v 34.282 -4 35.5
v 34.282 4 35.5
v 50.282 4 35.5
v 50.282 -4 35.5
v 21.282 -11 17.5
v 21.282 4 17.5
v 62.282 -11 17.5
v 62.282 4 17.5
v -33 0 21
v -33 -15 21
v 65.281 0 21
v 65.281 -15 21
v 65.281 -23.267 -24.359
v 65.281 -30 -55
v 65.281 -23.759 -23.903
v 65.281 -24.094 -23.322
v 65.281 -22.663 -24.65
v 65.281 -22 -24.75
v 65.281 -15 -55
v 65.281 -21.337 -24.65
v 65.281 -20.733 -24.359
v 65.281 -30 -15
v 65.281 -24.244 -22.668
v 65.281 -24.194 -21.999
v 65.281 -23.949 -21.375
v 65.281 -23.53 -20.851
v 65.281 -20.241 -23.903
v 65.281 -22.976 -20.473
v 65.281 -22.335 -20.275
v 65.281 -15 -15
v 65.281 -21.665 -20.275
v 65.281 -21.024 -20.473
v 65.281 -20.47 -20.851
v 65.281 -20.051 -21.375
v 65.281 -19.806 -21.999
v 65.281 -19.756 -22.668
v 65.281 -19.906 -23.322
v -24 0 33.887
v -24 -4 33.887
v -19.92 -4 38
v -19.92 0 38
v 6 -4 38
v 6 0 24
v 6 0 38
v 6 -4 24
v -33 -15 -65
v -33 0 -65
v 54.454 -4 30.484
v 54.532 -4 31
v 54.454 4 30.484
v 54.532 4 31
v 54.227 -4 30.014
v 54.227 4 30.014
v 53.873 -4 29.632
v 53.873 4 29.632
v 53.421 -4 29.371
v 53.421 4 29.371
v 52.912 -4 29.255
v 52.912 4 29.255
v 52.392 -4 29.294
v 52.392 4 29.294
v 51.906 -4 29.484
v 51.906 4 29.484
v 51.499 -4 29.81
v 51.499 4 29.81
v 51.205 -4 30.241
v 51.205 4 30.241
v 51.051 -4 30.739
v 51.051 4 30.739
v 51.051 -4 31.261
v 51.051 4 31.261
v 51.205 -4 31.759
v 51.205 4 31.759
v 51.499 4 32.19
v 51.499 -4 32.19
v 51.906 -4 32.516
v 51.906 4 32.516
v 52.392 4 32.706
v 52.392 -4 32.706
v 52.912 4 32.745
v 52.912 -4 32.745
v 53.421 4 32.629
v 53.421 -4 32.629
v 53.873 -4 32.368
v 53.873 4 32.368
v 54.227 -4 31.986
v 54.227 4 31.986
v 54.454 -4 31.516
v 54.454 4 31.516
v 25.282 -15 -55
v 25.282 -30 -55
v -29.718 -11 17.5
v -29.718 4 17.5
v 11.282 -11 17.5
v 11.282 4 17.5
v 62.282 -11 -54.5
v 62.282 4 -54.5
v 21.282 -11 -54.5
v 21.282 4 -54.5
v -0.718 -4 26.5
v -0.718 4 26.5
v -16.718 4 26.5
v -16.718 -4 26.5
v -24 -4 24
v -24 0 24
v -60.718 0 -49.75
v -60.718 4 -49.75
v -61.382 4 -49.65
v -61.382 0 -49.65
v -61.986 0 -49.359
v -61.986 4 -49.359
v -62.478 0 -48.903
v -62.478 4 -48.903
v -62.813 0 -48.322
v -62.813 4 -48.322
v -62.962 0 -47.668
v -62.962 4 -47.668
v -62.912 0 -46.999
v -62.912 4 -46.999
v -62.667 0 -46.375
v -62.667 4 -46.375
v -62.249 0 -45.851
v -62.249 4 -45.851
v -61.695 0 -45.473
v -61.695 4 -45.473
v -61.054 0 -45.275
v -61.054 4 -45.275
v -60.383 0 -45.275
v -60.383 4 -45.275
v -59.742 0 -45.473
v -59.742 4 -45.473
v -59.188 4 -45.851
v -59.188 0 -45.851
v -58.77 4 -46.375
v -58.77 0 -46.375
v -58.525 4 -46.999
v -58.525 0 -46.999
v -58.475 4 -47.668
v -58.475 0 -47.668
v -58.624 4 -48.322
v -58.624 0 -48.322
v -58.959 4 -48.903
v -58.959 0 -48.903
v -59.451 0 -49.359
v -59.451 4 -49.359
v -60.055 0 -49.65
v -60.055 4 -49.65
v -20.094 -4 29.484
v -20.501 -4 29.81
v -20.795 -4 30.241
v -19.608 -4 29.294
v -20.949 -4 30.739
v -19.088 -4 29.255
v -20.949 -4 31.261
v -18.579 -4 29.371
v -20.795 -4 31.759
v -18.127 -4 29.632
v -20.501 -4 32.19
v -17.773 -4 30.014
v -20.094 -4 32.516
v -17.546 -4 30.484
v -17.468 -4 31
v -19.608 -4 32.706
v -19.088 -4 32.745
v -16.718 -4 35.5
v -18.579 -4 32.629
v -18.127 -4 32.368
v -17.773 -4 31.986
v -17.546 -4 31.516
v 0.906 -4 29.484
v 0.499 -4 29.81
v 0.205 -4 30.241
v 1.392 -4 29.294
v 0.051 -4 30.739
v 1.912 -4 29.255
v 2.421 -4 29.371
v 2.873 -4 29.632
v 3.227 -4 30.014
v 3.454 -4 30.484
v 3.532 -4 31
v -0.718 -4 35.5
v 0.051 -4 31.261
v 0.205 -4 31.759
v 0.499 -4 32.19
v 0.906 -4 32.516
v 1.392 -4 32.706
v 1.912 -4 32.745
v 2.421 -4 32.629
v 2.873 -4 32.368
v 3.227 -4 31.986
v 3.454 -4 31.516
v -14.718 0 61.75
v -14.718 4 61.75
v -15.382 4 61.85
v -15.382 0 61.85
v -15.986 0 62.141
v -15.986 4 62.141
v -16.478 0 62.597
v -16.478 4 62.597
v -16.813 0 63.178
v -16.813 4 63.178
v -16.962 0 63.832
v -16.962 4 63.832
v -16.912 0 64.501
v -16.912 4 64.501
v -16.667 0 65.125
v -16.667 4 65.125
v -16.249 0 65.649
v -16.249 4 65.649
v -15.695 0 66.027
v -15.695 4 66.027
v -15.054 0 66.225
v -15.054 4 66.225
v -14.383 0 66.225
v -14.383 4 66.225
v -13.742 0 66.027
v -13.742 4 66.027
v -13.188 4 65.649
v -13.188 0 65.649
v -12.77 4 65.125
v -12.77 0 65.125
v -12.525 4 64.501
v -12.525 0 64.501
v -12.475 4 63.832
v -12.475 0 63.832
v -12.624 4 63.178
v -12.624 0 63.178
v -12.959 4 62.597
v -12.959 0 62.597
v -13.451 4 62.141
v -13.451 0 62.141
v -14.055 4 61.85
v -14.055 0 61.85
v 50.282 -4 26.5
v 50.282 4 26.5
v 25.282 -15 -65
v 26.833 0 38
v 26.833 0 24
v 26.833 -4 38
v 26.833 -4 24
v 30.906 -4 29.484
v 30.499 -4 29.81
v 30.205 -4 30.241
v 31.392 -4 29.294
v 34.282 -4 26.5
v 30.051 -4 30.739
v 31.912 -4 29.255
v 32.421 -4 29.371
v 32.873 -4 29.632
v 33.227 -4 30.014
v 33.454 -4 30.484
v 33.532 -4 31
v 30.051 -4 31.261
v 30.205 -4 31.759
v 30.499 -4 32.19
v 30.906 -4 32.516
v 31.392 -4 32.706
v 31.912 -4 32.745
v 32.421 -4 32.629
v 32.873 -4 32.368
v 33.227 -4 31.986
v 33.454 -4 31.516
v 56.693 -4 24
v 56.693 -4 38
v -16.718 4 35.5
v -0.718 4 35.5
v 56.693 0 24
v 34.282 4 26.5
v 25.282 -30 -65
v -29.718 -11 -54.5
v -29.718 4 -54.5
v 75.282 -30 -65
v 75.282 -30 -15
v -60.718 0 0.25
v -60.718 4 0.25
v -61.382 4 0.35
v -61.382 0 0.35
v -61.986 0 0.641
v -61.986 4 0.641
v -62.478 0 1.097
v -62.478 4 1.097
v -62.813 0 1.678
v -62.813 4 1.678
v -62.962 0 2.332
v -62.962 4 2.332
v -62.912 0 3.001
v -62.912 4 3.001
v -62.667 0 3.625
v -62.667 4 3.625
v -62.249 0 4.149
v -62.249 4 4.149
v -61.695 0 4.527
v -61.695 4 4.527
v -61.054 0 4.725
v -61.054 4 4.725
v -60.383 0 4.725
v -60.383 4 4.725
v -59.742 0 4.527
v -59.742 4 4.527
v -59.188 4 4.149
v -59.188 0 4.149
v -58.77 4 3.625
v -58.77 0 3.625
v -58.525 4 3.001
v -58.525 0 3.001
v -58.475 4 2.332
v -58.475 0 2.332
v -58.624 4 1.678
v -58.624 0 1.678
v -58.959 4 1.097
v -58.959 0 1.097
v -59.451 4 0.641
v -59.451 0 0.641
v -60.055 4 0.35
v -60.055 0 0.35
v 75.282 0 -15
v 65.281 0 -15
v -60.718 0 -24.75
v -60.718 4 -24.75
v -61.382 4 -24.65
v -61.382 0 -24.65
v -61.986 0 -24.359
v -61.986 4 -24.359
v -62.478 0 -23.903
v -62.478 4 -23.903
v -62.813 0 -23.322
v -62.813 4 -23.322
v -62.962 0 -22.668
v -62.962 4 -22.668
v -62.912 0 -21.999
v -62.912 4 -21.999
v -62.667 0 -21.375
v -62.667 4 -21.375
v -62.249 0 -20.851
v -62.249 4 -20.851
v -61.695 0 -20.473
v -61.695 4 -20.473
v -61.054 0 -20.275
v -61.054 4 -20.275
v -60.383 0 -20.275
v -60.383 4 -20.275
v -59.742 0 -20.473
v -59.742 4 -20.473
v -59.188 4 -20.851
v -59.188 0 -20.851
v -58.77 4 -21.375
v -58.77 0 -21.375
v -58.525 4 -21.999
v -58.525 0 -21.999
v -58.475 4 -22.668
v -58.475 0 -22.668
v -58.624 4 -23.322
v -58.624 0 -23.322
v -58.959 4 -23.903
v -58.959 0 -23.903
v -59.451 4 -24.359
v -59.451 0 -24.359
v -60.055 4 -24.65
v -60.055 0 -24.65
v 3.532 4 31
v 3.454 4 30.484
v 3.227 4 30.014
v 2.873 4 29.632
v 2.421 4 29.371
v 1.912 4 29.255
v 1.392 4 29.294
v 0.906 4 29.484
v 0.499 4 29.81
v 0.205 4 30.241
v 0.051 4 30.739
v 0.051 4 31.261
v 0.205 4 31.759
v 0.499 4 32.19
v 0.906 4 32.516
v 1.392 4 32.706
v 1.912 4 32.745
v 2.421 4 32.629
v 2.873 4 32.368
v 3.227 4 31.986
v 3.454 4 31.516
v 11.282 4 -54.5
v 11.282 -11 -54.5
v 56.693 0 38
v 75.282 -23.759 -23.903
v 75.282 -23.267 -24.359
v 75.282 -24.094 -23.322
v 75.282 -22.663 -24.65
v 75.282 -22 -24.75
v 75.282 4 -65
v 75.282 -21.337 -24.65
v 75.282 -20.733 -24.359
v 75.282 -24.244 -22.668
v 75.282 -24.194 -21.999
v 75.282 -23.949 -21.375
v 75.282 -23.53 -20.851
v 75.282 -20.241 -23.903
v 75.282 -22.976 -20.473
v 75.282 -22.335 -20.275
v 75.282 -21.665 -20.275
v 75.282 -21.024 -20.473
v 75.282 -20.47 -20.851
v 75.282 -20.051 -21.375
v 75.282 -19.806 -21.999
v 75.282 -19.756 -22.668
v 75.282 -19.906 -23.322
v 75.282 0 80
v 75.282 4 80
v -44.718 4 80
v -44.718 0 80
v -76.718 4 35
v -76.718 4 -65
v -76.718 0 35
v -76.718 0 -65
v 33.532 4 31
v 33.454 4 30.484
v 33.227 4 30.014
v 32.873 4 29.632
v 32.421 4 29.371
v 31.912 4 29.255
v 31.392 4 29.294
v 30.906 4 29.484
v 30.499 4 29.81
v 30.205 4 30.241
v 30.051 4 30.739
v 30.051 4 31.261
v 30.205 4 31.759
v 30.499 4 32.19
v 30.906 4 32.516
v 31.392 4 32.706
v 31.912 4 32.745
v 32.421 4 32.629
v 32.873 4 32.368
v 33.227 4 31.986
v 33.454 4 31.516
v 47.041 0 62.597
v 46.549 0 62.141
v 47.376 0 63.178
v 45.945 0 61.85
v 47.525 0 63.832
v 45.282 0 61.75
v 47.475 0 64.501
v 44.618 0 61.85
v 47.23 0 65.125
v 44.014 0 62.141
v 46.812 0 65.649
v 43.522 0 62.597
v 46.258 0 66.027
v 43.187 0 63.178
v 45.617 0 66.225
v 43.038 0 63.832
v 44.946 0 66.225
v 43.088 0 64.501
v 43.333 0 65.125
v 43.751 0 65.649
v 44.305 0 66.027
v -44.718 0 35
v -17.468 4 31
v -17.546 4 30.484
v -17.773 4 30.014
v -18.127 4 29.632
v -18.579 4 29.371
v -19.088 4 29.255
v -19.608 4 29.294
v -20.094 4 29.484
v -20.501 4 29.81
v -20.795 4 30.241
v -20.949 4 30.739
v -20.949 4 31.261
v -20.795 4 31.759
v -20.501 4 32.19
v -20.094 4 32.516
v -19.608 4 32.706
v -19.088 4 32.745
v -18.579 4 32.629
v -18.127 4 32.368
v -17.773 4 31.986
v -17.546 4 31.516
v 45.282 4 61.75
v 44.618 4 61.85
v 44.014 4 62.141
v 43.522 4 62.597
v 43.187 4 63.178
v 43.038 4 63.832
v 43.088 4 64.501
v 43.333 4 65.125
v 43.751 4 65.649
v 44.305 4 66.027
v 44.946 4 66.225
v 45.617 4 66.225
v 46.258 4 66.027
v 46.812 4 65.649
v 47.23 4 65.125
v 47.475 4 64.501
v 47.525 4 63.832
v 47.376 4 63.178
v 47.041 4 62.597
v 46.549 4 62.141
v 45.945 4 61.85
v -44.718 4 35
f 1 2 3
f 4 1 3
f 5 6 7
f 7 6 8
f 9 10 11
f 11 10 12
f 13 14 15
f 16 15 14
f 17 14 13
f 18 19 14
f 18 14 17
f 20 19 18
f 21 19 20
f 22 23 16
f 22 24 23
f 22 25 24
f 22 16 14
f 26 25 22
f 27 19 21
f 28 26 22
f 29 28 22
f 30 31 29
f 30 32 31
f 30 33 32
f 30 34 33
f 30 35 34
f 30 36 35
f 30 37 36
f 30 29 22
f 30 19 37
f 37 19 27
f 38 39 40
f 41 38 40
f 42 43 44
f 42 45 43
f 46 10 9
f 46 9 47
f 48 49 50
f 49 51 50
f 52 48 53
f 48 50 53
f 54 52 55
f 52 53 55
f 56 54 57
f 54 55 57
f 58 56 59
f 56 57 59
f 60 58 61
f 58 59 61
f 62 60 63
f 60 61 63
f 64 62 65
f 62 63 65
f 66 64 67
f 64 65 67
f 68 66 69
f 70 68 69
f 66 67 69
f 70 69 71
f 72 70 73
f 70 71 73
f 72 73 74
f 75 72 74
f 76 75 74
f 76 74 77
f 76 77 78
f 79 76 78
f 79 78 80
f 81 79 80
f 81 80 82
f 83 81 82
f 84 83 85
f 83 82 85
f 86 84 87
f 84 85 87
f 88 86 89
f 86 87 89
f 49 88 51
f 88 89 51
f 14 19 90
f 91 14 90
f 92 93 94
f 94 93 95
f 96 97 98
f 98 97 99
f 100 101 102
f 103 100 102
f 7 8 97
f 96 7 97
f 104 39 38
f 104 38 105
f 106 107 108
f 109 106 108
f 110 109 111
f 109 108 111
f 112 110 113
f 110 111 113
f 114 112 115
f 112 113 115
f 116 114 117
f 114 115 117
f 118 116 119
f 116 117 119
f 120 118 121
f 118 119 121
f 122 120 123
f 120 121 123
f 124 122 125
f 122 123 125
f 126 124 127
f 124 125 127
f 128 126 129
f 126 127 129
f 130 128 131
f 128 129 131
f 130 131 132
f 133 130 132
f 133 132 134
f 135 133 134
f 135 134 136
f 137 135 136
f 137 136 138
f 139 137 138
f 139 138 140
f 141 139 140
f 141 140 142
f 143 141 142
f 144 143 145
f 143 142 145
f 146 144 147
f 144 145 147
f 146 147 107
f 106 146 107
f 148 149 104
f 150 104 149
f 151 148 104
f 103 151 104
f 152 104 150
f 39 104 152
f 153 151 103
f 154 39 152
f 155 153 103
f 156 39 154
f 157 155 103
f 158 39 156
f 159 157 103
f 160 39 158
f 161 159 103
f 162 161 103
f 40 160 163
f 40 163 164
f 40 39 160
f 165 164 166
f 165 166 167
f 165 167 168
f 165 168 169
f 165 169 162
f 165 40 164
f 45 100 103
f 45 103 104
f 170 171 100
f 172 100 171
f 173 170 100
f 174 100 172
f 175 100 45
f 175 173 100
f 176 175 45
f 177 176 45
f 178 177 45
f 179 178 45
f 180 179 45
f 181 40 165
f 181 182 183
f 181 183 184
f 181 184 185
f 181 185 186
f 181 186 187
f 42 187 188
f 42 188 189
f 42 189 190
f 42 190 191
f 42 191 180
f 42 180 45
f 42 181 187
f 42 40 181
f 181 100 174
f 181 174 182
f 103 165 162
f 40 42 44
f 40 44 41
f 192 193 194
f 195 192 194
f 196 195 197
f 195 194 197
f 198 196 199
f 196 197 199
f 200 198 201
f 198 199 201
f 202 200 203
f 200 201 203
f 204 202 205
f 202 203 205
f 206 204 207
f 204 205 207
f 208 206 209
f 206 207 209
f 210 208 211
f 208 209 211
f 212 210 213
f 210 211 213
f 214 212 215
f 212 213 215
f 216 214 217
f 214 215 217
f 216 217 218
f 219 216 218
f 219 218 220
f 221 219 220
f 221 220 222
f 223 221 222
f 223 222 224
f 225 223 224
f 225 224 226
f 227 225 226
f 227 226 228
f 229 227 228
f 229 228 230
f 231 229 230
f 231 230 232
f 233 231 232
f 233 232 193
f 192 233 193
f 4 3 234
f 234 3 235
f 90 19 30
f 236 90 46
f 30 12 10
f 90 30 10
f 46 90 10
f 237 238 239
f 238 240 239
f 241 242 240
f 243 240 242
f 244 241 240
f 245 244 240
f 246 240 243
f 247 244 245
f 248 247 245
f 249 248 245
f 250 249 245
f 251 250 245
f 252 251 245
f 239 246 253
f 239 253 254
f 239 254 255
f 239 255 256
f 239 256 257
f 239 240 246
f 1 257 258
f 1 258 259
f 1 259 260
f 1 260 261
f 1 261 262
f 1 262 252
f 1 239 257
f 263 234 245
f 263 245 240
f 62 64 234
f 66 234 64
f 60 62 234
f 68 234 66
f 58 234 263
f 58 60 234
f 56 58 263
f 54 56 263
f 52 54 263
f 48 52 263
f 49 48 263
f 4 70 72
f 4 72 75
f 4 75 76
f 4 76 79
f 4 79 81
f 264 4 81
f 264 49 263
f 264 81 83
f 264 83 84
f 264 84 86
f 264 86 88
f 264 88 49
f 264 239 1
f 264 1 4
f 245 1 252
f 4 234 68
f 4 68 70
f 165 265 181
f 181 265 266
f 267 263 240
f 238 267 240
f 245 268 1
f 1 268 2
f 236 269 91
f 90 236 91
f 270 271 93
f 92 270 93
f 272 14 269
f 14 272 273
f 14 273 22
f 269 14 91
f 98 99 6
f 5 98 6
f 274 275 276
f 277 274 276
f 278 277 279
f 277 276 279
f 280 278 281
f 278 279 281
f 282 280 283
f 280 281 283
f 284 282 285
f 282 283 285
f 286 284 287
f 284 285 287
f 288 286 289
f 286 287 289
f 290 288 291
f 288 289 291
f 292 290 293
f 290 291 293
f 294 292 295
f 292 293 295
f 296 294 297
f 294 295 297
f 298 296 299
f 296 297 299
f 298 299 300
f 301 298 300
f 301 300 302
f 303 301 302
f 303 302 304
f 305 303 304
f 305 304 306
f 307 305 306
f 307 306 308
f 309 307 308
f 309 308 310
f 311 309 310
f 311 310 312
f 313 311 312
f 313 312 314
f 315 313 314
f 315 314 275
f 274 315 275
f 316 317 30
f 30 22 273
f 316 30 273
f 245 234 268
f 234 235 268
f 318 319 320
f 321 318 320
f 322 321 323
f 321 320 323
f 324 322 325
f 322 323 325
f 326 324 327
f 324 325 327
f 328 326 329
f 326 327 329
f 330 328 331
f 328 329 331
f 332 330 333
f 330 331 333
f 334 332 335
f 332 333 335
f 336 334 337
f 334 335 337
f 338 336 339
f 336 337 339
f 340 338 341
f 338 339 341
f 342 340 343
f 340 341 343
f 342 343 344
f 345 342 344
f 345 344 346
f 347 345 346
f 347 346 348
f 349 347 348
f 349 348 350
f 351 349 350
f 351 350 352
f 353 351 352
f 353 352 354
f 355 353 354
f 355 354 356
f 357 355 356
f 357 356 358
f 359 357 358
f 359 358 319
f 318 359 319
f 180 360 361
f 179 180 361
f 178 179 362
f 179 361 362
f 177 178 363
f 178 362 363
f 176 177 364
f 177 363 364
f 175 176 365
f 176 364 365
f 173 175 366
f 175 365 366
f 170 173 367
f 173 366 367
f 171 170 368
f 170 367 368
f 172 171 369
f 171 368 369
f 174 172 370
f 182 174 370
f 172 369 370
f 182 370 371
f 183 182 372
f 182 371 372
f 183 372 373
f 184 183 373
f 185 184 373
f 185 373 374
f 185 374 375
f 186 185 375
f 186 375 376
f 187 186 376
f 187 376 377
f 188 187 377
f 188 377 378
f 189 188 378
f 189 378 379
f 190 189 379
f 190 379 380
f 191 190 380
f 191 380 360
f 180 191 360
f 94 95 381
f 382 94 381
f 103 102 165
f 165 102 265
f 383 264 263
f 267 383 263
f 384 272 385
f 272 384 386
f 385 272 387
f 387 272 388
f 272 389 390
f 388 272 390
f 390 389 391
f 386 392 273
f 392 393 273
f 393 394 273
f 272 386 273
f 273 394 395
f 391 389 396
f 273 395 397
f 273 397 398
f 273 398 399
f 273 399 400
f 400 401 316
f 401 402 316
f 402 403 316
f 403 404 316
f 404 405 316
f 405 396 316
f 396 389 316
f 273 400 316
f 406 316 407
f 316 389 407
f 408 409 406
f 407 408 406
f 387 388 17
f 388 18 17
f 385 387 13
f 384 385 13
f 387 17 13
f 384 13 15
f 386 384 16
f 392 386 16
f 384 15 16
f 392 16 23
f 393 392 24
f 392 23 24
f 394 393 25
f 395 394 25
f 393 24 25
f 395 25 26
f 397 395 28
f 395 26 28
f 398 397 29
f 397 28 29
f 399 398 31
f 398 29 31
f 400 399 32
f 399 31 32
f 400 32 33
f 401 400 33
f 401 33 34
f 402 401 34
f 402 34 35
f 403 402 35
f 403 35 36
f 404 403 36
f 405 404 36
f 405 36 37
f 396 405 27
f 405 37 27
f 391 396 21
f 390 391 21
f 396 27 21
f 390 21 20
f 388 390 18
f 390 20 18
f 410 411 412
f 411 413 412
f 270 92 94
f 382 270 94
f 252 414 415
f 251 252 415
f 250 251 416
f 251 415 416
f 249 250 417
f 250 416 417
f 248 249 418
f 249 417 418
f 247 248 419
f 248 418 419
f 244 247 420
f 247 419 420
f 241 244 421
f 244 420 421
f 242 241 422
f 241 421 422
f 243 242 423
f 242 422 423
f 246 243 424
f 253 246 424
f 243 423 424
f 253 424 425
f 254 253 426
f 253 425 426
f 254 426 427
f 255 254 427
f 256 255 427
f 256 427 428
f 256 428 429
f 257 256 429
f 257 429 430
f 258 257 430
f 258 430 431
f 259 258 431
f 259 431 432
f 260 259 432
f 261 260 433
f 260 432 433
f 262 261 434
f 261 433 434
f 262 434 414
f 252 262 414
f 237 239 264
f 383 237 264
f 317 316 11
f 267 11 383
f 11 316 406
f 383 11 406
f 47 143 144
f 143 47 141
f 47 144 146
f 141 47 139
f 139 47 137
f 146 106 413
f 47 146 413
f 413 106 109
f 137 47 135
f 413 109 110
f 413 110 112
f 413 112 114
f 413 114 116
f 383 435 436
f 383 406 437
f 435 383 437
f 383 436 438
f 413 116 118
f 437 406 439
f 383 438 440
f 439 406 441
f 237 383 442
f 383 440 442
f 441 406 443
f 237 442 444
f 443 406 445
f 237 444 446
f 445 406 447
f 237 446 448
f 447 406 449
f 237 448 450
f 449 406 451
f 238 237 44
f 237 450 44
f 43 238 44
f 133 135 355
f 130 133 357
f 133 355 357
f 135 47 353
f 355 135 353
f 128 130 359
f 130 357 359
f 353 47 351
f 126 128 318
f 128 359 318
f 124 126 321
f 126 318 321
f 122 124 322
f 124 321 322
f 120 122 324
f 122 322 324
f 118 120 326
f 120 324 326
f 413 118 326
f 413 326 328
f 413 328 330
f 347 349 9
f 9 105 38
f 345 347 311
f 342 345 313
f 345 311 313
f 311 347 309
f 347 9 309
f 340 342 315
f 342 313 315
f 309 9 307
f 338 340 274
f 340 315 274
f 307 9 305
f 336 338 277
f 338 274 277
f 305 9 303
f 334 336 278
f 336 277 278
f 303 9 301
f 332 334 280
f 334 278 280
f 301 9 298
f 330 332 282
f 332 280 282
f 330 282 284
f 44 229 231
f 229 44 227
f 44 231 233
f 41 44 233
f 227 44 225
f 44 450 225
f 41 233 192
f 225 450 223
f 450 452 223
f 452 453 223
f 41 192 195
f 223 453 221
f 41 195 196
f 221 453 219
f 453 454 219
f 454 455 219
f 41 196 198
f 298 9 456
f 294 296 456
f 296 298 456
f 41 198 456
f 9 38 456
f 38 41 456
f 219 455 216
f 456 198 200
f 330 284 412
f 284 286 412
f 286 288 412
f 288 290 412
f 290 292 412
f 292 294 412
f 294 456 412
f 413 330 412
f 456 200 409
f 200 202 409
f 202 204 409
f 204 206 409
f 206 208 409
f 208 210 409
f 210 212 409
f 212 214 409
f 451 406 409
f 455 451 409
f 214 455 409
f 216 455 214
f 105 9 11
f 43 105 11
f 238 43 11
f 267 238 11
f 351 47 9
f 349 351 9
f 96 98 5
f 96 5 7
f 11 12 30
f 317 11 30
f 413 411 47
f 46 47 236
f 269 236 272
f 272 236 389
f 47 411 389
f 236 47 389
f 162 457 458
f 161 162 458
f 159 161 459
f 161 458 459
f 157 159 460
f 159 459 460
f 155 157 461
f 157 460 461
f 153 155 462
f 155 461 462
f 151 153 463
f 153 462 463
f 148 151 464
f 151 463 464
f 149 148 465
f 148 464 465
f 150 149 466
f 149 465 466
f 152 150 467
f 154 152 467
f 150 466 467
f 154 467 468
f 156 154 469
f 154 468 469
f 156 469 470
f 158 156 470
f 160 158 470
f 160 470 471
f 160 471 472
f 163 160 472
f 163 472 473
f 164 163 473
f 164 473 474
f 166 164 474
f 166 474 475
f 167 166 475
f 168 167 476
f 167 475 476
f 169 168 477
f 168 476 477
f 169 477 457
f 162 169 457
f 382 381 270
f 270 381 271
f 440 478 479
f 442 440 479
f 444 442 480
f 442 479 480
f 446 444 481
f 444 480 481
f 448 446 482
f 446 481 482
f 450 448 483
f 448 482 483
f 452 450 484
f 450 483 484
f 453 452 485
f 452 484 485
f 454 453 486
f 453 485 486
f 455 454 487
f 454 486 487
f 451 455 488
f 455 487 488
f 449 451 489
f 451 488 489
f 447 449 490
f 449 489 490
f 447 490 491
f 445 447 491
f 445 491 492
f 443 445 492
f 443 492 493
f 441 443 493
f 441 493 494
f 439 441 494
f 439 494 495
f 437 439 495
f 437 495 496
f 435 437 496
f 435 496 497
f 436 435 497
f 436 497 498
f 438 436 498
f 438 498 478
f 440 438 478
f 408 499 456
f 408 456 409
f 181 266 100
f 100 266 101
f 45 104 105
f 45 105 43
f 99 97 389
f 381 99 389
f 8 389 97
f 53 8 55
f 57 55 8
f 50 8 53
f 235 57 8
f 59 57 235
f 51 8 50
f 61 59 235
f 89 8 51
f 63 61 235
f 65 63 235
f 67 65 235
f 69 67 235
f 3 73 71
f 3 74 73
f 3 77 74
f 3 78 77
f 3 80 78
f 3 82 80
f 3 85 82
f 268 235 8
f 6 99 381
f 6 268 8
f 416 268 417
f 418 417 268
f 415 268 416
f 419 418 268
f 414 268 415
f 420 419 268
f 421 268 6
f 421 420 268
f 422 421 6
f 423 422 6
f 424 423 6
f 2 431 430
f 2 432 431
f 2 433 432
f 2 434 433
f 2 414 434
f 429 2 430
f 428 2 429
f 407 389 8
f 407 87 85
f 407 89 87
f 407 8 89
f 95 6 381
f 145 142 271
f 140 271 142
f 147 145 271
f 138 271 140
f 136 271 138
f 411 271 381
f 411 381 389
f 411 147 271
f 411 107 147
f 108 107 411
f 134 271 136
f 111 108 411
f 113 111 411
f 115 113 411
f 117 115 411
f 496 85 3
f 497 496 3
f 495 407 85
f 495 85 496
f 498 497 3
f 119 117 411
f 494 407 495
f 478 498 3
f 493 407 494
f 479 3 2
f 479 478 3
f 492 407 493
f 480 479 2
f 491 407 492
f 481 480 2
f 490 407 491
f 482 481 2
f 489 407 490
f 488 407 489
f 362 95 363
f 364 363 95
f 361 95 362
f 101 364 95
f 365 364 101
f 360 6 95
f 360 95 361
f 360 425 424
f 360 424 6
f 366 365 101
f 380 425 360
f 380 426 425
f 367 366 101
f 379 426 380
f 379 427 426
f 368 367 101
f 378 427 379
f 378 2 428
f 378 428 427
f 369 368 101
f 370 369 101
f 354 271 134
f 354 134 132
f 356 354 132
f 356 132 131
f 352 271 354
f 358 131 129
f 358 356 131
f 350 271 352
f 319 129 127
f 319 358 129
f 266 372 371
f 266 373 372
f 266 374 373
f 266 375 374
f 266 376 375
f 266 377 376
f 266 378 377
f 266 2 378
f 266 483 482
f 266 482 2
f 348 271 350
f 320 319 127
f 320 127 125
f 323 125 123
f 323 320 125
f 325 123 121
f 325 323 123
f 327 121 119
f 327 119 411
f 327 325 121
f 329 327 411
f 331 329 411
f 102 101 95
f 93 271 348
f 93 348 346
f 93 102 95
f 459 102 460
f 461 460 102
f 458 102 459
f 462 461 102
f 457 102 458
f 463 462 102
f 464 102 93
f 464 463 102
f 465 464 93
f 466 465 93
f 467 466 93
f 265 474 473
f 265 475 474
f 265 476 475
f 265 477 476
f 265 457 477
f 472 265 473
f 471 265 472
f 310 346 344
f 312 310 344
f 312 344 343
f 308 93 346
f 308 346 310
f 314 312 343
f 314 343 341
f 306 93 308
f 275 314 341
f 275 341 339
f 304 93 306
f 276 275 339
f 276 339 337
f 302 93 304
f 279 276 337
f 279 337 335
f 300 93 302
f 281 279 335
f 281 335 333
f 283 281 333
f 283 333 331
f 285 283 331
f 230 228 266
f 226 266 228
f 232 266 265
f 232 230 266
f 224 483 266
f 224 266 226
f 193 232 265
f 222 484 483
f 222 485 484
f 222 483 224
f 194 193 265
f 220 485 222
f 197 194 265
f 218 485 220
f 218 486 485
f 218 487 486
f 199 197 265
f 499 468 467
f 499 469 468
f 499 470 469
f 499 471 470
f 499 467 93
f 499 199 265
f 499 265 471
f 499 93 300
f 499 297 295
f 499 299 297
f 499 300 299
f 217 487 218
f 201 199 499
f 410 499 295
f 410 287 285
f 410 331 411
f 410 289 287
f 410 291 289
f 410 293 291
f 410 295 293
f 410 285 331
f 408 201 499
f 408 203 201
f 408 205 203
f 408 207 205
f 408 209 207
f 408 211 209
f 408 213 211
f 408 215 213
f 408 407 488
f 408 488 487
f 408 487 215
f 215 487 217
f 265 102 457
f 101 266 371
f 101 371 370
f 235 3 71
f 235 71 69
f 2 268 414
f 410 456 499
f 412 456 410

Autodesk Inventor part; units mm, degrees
ref_plane "YZ Plane" through (0, 0, 0) normal (1, 0, 0) x (0, 1, 0)
ref_plane "XZ Plane" through (0, 0, 0) normal (0, 1, 0) x (-1, 0, 0)
ref_plane "XY Plane" through (0, 0, 0) normal (0, 0, 1) x (1, 0, 0)
sketch "Szkic1" plane through (0, 0, 0) normal (0, 1, 0) x (-1, 0, 0)
  line L0 (44.7185, 35) -> (76.7185, 35)
  line L1 (76.7185, 35) -> (44.7185, 35)
  line L2 (44.7185, -65) -> (76.7185, -65)
  line L3 (76.7185, -65) -> (76.7185, 35)
  line L4 (44.7185, 80) -> (-75.2815, 80)
  line L5 (44.7185, 48) -> (44.7185, 80)
  line L6 (44.7185, -65) -> (44.7185, -55)
  line L7 (-75.2815, -65) -> (-75.2815, 48)
  line L8 (44.7185, -65) -> (-75.2815, -65)
  line L9 (-75.2815, 48) -> (-65.2815, 48)
  line L10 (-75.2815, 48) -> (-75.2815, 80)
  line L11 (44.7185, 35) -> (44.7185, -55)
  line L12 (-65.2815, -55) -> (44.7185, -55)
  line L13 (-65.2815, -55) -> (-65.2815, 48)
  line L14 (44.7185, 48) -> (-65.2815, 48)
  line L15 (44.7185, 35) -> (44.7185, 48)
  point P0 (0, 0)
  point P1 (14.7185, 64)
  point P2 (-45.2815, 64)
  point P3 (60.7185, 2.5)
  point P4 (60.7185, -47.5)
  point P5 (60.7185, -22.5)
  dimension "d2" = 32
  dimension "d3" = 45
  dimension "d4" = 32
  dimension "d5" = 32
  dimension "d23" = 100
  dimension "d24" = 10
  dimension "d25" = 10
  dimension "d26" = 120
  dimension "d27" = 16
  dimension "d28" = 16
  dimension "d29" = 50
  dimension "d30" = 16
  dimension "d31" = 16
  dimension "d32" = 60
  dimension "d33" = 17.5
  dimension "d34" = 30
  dimension "d126" = 42.5
extrude "Wyciągnięcie proste1" add sketch "Szkic1" along normal blind 4
extrude "Wyciągnięcie proste2" add sketch "Szkic1" against normal blind 15 contours L11 L12 L13 L14 L15
extrude "Wyciągnięcie proste3" add sketch "Szkic1" against normal blind 30 contours L6 L8 L7 L9 L13 L12
sketch "Szkic3" plane through (0, 4, 0) normal (0, 1, 0) x (1, 0, 0)
  line L0 (-76.7185, -35) -> (-44.7185, -35) projected
  line L1 (-44.7185, -35) -> (-44.7185, -80) projected
  line L2 (-44.7185, -80) -> (75.2815, -80) projected
  line L3 (75.2815, -80) -> (75.2815, 65) projected
  line L4 (75.2815, 65) -> (-76.7185, 65) projected
  line L5 (-76.7185, 65) -> (-76.7185, -35) projected
  line L6 (-44.7185, -48) -> (75.2815, -48) projected
  line L7 (-44.7185, 65) -> (-44.7185, -35) projected
  line L8 (-44.7185, 55) -> (65.2815, 55) projected
  line L9 (65.2815, 55) -> (65.2815, -48) projected
  line L10 (-29.7185, -17.5) -> (11.2815, -17.5)
  line L11 (11.2815, -17.5) -> (11.2815, 54.5)
  line L12 (11.2815, 54.5) -> (-29.7185, 54.5)
  line L13 (-29.7185, 54.5) -> (-29.7185, -17.5)
  line L14 (21.2815, -17.5) -> (62.2815, -17.5)
  line L15 (62.2815, -17.5) -> (62.2815, 54.5)
  line L16 (62.2815, 54.5) -> (21.2815, 54.5)
  line L17 (21.2815, 54.5) -> (21.2815, -17.5)
  line L18 (-16.7185, -35.5) -> (-0.7185, -35.5)
  line L19 (-0.7185, -35.5) -> (-0.7185, -26.5)
  line L20 (-0.7185, -26.5) -> (-16.7185, -26.5)
  line L21 (-16.7185, -26.5) -> (-16.7185, -35.5)
  line L22 (-16.7185, -35.5) -> (-0.7185, -26.5) construction
  line L23 (-0.7185, -35.5) -> (-16.7185, -26.5) construction
  circle A0 centre (-19.2185, -31) radius 1.75
  circle A1 centre (1.7815, -31) radius 1.75
  line L24 (-19.2185, -31) -> (1.7815, -31) construction
  circle A2 centre (52.7815, -31) radius 1.75
  line L25 (50.2815, -35.5) -> (50.2815, -26.5)
  line L26 (50.2815, -26.5) -> (34.2815, -26.5)
  line L27 (34.2815, -26.5) -> (34.2815, -35.5)
  line L28 (34.2815, -35.5) -> (50.2815, -26.5) construction
  line L29 (50.2815, -35.5) -> (34.2815, -26.5) construction
  line L30 (34.2815, -35.5) -> (50.2815, -35.5)
  line L31 (31.7815, -31) -> (52.7815, -31) construction
  circle A3 centre (31.7815, -31) radius 1.75
  point P0 (0, 0)
  point P1 (-8.7185, -31)
  point P2 (42.2815, -31)
  dimension "d35" = 41
  dimension "d36" = 72
  dimension "d37" = 41
  dimension "d38" = 72
  dimension "d39" = 10
  dimension "d40" = 15
  dimension "d41" = 30.5
  dimension "d50" = 30.5
  dimension "d78" = 16
  dimension "d79" = 9
  dimension "d80" = 3.5
  dimension "d81" = 3.5
  dimension "d82" = 10.5
  dimension "d83" = 10.5
  dimension "d86" = 4.5
  dimension "d87" = 4.5
  dimension "d88" = 20
  dimension "d89" = 9
  dimension "d90" = 16
  dimension "d91" = 9
  dimension "d92" = 3.5
  dimension "d93" = 3.5
  dimension "d94" = 10.5
  dimension "d95" = 10.5
  dimension "d96" = 4.5
  dimension "d97" = 4.5
  dimension "d102" = 9
  dimension "d127" = 20
extrude "Wyciągnięcie proste4" cut sketch "Szkic3" against normal blind 15 contours L13 L12 L11 L10 | L17 L16 L15 L14
extrude "Wyciągnięcie proste5" cut sketch "Szkic3" against normal blind 20 contours L21 L20 L19 L18 | A0 | A1 | A2 | L30 L27 L26 L25 | A3
sketch "Szkic4" plane through (0, -30, 0) normal (0, -1, 0) x (1, 0, 0)
  line L0 (-44.7185, 48) -> (-44.7185, -55) projected
  line L1 (-44.7185, -55) -> (65.2815, -55) projected
  line L2 (65.2815, -55) -> (65.2815, 48) projected
  line L3 (65.2815, 48) -> (-44.7185, 48) projected
  line L4 (-44.7185, -55) -> (-44.7185, -65) projected
  line L5 (-44.7185, -65) -> (75.2815, -65) projected
  line L6 (75.2815, -65) -> (75.2815, 48) projected
  line L7 (75.2815, 48) -> (65.2815, 48) projected
  line L8 (65.2815, 48) -> (65.2815, -55) projected
  line L9 (65.2815, -55) -> (-44.7185, -55) projected
  line L10 (65.2815, -55) -> (65.2815, 48) projected
  line L11 (75.2815, -65) -> (75.2815, 48) projected
  line L12 (65.2815, -15) -> (75.2815, -15)
  line L13 (75.2815, -15) -> (75.2815, 55)
  line L14 (75.2815, 55) -> (65.2815, 55)
  line L15 (65.2815, 55) -> (65.2815, -15)
  line L16 (-44.7185, -55) -> (65.2815, -55) projected
  line L17 (25.2815, -55) -> (-44.7185, -55)
  line L18 (-44.7185, -55) -> (-44.7185, -65)
  line L19 (-44.7185, -65) -> (25.2815, -65)
  line L20 (25.2815, -65) -> (25.2815, -55)
  dimension "d111" = 70
  dimension "d112" = 70
  dimension "d113" = 50
  dimension "d114" = 50
extrude "Wyciągnięcie proste6" cut sketch "Szkic4" against normal blind 15 contours L1 L20 L5 L4 | L7 L6 L12 L2 | L15 L14 L13 L7
hole "Otwór1" at (-14.7185, 0, 64) at (45.2815, 0, 64) at (-60.7185, 0, 2.5) at (-60.7185, 0, -47.5) at (-60.7185, 0, -22.5) direction (0, 1, 0) diameter 4.5 end through all clearance for "Śruba ze łbem płaskim obrobiona" size "M4" standard "ANSI Profil metryczny M"
sketch "Szkic5" plane through (0, -15, 0) normal (0, -1, 0) x (1, 0, 0)
  line L0 (-45, 48) -> (-10, 48)
  line L1 (65.2815, 48) -> (-44.7185, 48) projected
  line L2 (-45, 48) -> (-44.7185, 13.0011)
  line L3 (-44.7185, 13.0011) -> (-10, 48)
  point P0 (0, 0)
  dimension "d74" = 35
extrude "Wyciągnięcie proste7" cut sketch "Szkic5" against normal blind 15
sketch "Szkic6" plane through (75.2815, 0, 80) normal (1, 0, 0) x (0, 0, -1)
  line L0 (145, -30) -> (145, 4) projected
  line L1 (145, -30) -> (95, -30) projected
  point P0 (80, 0)
  point P1 (102.5, -22)
  dimension "d117" = 42.5
  dimension "d118" = 8
hole "Otwór2" at (75.2815, -22, -22.5) direction (-1, 0, 0) diameter 4.5 end through all clearance for "Śruba ze łbem płaskim obrobiona" size "M4" standard "ANSI Profil metryczny M"
sketch "Szkic8" plane through (0, -15, 0) normal (0, -1, 0) x (1, 0, 0)
  line L0 (-69, 21) -> (-69, 49)
  line L1 (-69, 49) -> (78, 49)
  line L2 (78, 49) -> (78, 21)
  line L3 (-33, -72) -> (-69, -72)
  line L4 (-69, -72) -> (-69, 21)
  line L5 (-33, 21) -> (-33, -72)
  line L6 (-33, 21) -> (78, 21)
  line L7 (11.2815, 17.5) -> (-29.7185, 17.5) projected
  line L8 (-29.7185, 17.5) -> (-29.7185, -54.5) projected
  line L9 (26.8332, 38) -> (56.6926, 38)
  line L10 (56.6926, 38) -> (56.6926, 24)
  line L11 (56.6926, 24) -> (26.8332, 24)
  line L12 (26.8332, 24) -> (26.8332, 38)
  line L13 (6, 38) -> (-24, 38)
  line L14 (-24, 38) -> (-24, 24)
  line L15 (-24, 24) -> (6, 24)
  line L16 (6, 24) -> (6, 38)
  line L17 (-29.7185, -54.5) -> (11.2815, -54.5) projected
  line L18 (21.2815, -54.5) -> (62.2815, -54.5) projected
  line L19 (62.2815, -54.5) -> (62.2815, 17.5) projected
  line L20 (62.2815, 17.5) -> (21.2815, 17.5) projected
  line L21 (65.2815, -55) -> (65.2815, -15) projected
  line L22 (78, 21) -> (65.2815, 21)
  line L23 (65.2815, 21) -> (65.2815, -15)
  line L24 (65.2815, -15) -> (78, -15)
  line L25 (78, -15) -> (78, 21)
  point P0 (0, 0)
  point P1 (65.2815, 48)
extrude "Wyciągnięcie proste9" cut sketch "Szkic8" against normal blind 15
sketch "Szkic9" plane through (0, -15, 0) normal (0, -1, 0) x (1, 0, 0)
  line L0 (-28, 43) -> (61, 43)
  line L1 (61, 43) -> (61, 22)
  line L2 (61, 22) -> (-28, 22)
  line L3 (-28, 22) -> (-28, 43)
  point P0 (0, 0)
extrude "Wyciągnięcie proste10" cut sketch "Szkic9" against normal blind 11
equation "\"d4\" = d5"
equation "\"d24\" = d25"
equation "\"d27\" = 0.5 * d2"
equation "\"d28\" = d27"
equation "\"d30\" = d27"
equation "\"d31\" = d27"
equation "\"d37\" = d35"
equation "\"d38\" = d36"
equation "\"d50\" = d41"
equation "\"d80\" = d84"
equation "\"d81\" = d80"
equation "\"d82\" = d85"
equation "\"d83\" = d82"
equation "\"d92\" = d98"
equation "\"d93\" = d92"
equation "\"d94\" = d99"
equation "\"d95\" = d94"
equation "\"d102\" = d89"
equation "\"d84\" = 3.5"
equation "\"d98\" = 3.5"
equation "\"d85\" = 10.5"
equation "\"d99\" = 10.5"
properties part number "slot na baterie"
